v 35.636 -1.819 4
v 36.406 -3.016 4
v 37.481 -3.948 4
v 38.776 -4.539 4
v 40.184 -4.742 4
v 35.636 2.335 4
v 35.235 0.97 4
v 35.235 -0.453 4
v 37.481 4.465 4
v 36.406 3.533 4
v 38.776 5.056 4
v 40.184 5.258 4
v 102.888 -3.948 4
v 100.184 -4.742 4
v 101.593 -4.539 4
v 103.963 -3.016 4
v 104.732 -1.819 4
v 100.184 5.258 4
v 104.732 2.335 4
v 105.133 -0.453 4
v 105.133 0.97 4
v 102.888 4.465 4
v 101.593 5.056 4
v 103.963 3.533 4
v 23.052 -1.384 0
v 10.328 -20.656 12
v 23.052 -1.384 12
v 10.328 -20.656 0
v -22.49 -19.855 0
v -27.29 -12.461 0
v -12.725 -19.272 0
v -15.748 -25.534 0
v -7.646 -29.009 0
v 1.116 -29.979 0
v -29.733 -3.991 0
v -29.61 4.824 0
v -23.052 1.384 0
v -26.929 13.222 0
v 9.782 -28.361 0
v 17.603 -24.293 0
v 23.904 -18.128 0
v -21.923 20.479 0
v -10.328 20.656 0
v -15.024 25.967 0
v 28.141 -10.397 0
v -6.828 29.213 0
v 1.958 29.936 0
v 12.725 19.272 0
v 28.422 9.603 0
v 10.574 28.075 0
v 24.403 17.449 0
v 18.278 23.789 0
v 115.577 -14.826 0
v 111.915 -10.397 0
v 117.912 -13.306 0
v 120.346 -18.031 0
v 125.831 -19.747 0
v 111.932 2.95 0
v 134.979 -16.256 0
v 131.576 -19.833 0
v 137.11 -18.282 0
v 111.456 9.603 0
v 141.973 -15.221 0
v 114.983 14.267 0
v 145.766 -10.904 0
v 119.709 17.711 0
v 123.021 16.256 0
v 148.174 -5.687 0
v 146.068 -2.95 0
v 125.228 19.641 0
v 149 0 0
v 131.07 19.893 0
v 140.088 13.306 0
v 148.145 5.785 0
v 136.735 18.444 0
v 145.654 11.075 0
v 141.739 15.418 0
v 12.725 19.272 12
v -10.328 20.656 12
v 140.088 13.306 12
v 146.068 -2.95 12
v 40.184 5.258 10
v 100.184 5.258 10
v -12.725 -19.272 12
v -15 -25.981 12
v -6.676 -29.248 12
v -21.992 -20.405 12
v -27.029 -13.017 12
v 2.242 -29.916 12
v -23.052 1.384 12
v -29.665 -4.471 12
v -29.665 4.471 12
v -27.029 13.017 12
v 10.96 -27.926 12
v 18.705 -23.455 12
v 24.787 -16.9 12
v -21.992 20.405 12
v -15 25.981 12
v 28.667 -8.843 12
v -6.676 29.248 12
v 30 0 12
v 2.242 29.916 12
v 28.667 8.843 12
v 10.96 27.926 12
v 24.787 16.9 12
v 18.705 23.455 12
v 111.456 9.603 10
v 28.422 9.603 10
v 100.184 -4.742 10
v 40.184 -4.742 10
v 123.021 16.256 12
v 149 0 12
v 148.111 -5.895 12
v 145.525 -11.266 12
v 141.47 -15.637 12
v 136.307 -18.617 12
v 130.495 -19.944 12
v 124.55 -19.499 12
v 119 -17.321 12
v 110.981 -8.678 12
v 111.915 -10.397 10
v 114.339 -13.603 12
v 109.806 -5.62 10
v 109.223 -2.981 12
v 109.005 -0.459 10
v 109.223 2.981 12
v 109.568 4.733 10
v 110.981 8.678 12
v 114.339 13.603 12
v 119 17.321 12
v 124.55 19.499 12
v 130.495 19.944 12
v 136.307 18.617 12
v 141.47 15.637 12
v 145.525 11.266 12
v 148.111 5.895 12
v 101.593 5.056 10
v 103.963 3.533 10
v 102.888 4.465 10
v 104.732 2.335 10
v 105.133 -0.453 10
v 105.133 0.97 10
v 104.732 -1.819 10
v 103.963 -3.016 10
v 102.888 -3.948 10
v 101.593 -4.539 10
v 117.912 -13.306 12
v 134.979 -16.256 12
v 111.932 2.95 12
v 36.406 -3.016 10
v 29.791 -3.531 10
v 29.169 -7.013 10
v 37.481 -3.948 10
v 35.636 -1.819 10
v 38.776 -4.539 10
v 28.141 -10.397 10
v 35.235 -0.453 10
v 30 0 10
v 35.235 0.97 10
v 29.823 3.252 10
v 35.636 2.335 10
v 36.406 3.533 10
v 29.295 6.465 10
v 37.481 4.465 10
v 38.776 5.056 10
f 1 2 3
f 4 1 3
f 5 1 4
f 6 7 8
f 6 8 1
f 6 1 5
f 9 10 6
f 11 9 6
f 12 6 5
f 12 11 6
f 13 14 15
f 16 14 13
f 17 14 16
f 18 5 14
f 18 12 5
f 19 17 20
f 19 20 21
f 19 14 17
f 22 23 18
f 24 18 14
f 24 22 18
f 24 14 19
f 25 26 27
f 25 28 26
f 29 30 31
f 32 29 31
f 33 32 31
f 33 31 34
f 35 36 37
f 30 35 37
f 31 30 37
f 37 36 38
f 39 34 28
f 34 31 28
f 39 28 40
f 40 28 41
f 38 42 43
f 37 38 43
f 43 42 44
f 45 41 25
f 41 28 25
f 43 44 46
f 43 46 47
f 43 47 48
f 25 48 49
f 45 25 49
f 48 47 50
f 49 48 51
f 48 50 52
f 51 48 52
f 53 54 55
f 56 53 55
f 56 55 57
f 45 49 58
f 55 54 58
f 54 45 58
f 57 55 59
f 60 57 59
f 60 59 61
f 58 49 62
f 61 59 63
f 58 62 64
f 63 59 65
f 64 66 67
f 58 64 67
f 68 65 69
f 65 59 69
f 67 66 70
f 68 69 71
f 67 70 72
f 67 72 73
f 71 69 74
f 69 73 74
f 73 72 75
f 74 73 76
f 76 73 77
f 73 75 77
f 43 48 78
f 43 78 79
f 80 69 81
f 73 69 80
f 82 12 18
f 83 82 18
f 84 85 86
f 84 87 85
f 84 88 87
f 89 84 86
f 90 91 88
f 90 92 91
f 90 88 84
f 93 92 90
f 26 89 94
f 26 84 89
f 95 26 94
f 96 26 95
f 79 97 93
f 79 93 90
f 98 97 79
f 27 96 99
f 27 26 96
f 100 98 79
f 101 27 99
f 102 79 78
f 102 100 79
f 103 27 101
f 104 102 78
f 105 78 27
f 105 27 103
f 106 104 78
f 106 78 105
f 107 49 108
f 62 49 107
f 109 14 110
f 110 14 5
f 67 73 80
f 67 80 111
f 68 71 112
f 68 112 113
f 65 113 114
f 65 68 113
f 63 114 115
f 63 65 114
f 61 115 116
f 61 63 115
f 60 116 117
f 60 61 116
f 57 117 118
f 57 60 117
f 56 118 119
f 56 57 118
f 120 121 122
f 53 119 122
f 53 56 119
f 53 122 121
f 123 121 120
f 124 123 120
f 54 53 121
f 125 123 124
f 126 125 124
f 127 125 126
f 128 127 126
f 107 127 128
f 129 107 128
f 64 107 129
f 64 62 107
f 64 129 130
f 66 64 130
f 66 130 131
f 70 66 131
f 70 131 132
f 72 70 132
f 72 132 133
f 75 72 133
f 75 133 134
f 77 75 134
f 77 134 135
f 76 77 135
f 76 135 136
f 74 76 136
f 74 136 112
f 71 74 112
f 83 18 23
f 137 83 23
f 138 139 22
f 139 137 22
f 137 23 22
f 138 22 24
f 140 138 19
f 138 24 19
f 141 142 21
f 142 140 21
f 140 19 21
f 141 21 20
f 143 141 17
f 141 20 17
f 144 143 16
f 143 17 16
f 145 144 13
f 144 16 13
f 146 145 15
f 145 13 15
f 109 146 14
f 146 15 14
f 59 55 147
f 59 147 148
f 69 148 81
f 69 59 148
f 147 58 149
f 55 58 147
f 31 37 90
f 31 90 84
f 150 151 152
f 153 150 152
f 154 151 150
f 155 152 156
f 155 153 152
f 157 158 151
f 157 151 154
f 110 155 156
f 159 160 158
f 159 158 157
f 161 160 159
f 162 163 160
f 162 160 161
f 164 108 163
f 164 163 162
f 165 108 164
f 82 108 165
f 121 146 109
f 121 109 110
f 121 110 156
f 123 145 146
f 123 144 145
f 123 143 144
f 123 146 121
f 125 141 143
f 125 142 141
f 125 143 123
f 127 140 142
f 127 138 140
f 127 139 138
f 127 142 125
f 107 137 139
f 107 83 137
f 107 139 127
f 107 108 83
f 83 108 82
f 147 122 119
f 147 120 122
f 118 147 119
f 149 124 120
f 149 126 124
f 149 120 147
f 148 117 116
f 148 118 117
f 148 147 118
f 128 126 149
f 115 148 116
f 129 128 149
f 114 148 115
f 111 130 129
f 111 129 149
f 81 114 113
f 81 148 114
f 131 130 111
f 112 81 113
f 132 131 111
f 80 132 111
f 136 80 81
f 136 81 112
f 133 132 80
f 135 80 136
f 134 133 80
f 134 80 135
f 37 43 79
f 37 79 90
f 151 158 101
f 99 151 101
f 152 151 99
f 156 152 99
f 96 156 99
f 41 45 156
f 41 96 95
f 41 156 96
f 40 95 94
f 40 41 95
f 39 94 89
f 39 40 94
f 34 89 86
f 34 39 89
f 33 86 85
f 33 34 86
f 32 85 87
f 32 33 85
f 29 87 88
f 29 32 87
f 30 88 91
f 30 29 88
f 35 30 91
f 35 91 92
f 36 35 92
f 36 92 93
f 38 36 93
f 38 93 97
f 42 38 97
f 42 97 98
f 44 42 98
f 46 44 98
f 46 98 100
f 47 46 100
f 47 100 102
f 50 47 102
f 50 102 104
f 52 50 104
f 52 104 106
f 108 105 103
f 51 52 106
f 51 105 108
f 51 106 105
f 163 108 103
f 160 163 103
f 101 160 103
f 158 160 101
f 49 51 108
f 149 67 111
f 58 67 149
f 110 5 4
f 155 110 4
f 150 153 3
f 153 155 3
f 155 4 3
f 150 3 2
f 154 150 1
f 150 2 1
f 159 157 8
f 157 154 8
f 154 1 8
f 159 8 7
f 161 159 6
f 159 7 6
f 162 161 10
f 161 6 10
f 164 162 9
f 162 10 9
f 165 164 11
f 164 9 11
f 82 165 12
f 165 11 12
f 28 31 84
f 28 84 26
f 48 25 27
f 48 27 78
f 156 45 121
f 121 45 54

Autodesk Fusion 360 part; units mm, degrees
sketch "Sketch1" plane through (0, 0, 0) normal (0, 0, 1) x (1, 0, 0) in component "ex2"
  circle A0 centre (0, 0) radius 30
  circle A1 centre (129, 0) radius 20
  line L0 (12.7246, 19.2722) -> (-10.328, 20.6559)
  line L1 (-10.328, 20.6559) -> (-23.0525, 1.3837)
  line L2 (-23.0525, 1.3837) -> (-12.7246, -19.2722)
  line L3 (-12.7246, -19.2722) -> (10.328, -20.6559)
  line L4 (10.328, -20.6559) -> (23.0525, -1.3837)
  line L5 (23.0525, -1.3837) -> (12.7246, 19.2722)
  line L6 (146.0675, -2.9498) -> (140.0883, 13.306)
  line L7 (140.0883, 13.306) -> (123.0208, 16.2558)
  line L8 (123.0208, 16.2558) -> (111.9325, 2.9498)
  line L9 (111.9325, 2.9498) -> (117.9117, -13.306)
  line L10 (117.9117, -13.306) -> (134.9792, -16.2558)
  line L11 (134.9792, -16.2558) -> (146.0675, -2.9498)
  line L12 (28.4216, 9.6028) -> (111.4561, 9.6028)
  line L13 (28.1407, -10.3972) -> (111.915, -10.3972)
  line L14 (70.2554, 9.6028) -> (70.2554, -10.3972) construction
  line L15 (40.1843, 5.2583) -> (100.1843, 5.2583)
  line L16 (100.1843, -4.7417) -> (40.1843, -4.7417)
  arc A2 (40.1843, 5.2583) -> (40.1843, -4.7417) centre (40.1843, 0.2583) ccw
  arc A3 (100.1843, -4.7417) -> (100.1843, 5.2583) centre (100.1843, 0.2583) ccw
  point P0 (129, 0)
  dimension "d1" = 60
  dimension "d2" = 40
  dimension "d3" = 129
  dimension "d4" = 20
  dimension "d5" = 15
  dimension "d6" = 20
  dimension "d9" = 60
  dimension "d10" = 10
extrude "Extrude1" add sketch "Sketch1" along normal blind 10 contours A0 A1 L12 L13 in component "ex2"
sketch "Sketch1 (2)" plane through (0, 0, 0) normal (0, 0, 1) x (1, 0, 0)
  line L0 (30, 0) -> (46.6152, 0) construction
sketch "Sketch2" plane through (0, 0, 0) normal (0, 0, 1) x (1, 0, 0)
  line L0 (40, 5) -> (100, 5)
  line L1 (100, -5) -> (40, -5)
  arc A0 (40, 5) -> (40, -5) centre (40, 0) ccw
  arc A1 (100, -5) -> (100, 5) centre (100, 0) ccw
  dimension "d7" = 10
  dimension "d8" = 60
sketch "Sketch2 (2)" plane through (0, 0, 0) normal (0, 0, 1) x (1, 0, 0) in component "ex2"
extrude "Extrude2" add sketch "Sketch1" along normal blind 12 contours A0 | A1 in component "ex2"
extrude "Extrude3" add sketch "Sketch1" along normal blind 4 contours L15 L16 A2 A3 in component "ex2"
component "ex2" placed x (1, 0, 0) y (0, 1, 0) z (0, 0, 1) at (0, 0, 0)
